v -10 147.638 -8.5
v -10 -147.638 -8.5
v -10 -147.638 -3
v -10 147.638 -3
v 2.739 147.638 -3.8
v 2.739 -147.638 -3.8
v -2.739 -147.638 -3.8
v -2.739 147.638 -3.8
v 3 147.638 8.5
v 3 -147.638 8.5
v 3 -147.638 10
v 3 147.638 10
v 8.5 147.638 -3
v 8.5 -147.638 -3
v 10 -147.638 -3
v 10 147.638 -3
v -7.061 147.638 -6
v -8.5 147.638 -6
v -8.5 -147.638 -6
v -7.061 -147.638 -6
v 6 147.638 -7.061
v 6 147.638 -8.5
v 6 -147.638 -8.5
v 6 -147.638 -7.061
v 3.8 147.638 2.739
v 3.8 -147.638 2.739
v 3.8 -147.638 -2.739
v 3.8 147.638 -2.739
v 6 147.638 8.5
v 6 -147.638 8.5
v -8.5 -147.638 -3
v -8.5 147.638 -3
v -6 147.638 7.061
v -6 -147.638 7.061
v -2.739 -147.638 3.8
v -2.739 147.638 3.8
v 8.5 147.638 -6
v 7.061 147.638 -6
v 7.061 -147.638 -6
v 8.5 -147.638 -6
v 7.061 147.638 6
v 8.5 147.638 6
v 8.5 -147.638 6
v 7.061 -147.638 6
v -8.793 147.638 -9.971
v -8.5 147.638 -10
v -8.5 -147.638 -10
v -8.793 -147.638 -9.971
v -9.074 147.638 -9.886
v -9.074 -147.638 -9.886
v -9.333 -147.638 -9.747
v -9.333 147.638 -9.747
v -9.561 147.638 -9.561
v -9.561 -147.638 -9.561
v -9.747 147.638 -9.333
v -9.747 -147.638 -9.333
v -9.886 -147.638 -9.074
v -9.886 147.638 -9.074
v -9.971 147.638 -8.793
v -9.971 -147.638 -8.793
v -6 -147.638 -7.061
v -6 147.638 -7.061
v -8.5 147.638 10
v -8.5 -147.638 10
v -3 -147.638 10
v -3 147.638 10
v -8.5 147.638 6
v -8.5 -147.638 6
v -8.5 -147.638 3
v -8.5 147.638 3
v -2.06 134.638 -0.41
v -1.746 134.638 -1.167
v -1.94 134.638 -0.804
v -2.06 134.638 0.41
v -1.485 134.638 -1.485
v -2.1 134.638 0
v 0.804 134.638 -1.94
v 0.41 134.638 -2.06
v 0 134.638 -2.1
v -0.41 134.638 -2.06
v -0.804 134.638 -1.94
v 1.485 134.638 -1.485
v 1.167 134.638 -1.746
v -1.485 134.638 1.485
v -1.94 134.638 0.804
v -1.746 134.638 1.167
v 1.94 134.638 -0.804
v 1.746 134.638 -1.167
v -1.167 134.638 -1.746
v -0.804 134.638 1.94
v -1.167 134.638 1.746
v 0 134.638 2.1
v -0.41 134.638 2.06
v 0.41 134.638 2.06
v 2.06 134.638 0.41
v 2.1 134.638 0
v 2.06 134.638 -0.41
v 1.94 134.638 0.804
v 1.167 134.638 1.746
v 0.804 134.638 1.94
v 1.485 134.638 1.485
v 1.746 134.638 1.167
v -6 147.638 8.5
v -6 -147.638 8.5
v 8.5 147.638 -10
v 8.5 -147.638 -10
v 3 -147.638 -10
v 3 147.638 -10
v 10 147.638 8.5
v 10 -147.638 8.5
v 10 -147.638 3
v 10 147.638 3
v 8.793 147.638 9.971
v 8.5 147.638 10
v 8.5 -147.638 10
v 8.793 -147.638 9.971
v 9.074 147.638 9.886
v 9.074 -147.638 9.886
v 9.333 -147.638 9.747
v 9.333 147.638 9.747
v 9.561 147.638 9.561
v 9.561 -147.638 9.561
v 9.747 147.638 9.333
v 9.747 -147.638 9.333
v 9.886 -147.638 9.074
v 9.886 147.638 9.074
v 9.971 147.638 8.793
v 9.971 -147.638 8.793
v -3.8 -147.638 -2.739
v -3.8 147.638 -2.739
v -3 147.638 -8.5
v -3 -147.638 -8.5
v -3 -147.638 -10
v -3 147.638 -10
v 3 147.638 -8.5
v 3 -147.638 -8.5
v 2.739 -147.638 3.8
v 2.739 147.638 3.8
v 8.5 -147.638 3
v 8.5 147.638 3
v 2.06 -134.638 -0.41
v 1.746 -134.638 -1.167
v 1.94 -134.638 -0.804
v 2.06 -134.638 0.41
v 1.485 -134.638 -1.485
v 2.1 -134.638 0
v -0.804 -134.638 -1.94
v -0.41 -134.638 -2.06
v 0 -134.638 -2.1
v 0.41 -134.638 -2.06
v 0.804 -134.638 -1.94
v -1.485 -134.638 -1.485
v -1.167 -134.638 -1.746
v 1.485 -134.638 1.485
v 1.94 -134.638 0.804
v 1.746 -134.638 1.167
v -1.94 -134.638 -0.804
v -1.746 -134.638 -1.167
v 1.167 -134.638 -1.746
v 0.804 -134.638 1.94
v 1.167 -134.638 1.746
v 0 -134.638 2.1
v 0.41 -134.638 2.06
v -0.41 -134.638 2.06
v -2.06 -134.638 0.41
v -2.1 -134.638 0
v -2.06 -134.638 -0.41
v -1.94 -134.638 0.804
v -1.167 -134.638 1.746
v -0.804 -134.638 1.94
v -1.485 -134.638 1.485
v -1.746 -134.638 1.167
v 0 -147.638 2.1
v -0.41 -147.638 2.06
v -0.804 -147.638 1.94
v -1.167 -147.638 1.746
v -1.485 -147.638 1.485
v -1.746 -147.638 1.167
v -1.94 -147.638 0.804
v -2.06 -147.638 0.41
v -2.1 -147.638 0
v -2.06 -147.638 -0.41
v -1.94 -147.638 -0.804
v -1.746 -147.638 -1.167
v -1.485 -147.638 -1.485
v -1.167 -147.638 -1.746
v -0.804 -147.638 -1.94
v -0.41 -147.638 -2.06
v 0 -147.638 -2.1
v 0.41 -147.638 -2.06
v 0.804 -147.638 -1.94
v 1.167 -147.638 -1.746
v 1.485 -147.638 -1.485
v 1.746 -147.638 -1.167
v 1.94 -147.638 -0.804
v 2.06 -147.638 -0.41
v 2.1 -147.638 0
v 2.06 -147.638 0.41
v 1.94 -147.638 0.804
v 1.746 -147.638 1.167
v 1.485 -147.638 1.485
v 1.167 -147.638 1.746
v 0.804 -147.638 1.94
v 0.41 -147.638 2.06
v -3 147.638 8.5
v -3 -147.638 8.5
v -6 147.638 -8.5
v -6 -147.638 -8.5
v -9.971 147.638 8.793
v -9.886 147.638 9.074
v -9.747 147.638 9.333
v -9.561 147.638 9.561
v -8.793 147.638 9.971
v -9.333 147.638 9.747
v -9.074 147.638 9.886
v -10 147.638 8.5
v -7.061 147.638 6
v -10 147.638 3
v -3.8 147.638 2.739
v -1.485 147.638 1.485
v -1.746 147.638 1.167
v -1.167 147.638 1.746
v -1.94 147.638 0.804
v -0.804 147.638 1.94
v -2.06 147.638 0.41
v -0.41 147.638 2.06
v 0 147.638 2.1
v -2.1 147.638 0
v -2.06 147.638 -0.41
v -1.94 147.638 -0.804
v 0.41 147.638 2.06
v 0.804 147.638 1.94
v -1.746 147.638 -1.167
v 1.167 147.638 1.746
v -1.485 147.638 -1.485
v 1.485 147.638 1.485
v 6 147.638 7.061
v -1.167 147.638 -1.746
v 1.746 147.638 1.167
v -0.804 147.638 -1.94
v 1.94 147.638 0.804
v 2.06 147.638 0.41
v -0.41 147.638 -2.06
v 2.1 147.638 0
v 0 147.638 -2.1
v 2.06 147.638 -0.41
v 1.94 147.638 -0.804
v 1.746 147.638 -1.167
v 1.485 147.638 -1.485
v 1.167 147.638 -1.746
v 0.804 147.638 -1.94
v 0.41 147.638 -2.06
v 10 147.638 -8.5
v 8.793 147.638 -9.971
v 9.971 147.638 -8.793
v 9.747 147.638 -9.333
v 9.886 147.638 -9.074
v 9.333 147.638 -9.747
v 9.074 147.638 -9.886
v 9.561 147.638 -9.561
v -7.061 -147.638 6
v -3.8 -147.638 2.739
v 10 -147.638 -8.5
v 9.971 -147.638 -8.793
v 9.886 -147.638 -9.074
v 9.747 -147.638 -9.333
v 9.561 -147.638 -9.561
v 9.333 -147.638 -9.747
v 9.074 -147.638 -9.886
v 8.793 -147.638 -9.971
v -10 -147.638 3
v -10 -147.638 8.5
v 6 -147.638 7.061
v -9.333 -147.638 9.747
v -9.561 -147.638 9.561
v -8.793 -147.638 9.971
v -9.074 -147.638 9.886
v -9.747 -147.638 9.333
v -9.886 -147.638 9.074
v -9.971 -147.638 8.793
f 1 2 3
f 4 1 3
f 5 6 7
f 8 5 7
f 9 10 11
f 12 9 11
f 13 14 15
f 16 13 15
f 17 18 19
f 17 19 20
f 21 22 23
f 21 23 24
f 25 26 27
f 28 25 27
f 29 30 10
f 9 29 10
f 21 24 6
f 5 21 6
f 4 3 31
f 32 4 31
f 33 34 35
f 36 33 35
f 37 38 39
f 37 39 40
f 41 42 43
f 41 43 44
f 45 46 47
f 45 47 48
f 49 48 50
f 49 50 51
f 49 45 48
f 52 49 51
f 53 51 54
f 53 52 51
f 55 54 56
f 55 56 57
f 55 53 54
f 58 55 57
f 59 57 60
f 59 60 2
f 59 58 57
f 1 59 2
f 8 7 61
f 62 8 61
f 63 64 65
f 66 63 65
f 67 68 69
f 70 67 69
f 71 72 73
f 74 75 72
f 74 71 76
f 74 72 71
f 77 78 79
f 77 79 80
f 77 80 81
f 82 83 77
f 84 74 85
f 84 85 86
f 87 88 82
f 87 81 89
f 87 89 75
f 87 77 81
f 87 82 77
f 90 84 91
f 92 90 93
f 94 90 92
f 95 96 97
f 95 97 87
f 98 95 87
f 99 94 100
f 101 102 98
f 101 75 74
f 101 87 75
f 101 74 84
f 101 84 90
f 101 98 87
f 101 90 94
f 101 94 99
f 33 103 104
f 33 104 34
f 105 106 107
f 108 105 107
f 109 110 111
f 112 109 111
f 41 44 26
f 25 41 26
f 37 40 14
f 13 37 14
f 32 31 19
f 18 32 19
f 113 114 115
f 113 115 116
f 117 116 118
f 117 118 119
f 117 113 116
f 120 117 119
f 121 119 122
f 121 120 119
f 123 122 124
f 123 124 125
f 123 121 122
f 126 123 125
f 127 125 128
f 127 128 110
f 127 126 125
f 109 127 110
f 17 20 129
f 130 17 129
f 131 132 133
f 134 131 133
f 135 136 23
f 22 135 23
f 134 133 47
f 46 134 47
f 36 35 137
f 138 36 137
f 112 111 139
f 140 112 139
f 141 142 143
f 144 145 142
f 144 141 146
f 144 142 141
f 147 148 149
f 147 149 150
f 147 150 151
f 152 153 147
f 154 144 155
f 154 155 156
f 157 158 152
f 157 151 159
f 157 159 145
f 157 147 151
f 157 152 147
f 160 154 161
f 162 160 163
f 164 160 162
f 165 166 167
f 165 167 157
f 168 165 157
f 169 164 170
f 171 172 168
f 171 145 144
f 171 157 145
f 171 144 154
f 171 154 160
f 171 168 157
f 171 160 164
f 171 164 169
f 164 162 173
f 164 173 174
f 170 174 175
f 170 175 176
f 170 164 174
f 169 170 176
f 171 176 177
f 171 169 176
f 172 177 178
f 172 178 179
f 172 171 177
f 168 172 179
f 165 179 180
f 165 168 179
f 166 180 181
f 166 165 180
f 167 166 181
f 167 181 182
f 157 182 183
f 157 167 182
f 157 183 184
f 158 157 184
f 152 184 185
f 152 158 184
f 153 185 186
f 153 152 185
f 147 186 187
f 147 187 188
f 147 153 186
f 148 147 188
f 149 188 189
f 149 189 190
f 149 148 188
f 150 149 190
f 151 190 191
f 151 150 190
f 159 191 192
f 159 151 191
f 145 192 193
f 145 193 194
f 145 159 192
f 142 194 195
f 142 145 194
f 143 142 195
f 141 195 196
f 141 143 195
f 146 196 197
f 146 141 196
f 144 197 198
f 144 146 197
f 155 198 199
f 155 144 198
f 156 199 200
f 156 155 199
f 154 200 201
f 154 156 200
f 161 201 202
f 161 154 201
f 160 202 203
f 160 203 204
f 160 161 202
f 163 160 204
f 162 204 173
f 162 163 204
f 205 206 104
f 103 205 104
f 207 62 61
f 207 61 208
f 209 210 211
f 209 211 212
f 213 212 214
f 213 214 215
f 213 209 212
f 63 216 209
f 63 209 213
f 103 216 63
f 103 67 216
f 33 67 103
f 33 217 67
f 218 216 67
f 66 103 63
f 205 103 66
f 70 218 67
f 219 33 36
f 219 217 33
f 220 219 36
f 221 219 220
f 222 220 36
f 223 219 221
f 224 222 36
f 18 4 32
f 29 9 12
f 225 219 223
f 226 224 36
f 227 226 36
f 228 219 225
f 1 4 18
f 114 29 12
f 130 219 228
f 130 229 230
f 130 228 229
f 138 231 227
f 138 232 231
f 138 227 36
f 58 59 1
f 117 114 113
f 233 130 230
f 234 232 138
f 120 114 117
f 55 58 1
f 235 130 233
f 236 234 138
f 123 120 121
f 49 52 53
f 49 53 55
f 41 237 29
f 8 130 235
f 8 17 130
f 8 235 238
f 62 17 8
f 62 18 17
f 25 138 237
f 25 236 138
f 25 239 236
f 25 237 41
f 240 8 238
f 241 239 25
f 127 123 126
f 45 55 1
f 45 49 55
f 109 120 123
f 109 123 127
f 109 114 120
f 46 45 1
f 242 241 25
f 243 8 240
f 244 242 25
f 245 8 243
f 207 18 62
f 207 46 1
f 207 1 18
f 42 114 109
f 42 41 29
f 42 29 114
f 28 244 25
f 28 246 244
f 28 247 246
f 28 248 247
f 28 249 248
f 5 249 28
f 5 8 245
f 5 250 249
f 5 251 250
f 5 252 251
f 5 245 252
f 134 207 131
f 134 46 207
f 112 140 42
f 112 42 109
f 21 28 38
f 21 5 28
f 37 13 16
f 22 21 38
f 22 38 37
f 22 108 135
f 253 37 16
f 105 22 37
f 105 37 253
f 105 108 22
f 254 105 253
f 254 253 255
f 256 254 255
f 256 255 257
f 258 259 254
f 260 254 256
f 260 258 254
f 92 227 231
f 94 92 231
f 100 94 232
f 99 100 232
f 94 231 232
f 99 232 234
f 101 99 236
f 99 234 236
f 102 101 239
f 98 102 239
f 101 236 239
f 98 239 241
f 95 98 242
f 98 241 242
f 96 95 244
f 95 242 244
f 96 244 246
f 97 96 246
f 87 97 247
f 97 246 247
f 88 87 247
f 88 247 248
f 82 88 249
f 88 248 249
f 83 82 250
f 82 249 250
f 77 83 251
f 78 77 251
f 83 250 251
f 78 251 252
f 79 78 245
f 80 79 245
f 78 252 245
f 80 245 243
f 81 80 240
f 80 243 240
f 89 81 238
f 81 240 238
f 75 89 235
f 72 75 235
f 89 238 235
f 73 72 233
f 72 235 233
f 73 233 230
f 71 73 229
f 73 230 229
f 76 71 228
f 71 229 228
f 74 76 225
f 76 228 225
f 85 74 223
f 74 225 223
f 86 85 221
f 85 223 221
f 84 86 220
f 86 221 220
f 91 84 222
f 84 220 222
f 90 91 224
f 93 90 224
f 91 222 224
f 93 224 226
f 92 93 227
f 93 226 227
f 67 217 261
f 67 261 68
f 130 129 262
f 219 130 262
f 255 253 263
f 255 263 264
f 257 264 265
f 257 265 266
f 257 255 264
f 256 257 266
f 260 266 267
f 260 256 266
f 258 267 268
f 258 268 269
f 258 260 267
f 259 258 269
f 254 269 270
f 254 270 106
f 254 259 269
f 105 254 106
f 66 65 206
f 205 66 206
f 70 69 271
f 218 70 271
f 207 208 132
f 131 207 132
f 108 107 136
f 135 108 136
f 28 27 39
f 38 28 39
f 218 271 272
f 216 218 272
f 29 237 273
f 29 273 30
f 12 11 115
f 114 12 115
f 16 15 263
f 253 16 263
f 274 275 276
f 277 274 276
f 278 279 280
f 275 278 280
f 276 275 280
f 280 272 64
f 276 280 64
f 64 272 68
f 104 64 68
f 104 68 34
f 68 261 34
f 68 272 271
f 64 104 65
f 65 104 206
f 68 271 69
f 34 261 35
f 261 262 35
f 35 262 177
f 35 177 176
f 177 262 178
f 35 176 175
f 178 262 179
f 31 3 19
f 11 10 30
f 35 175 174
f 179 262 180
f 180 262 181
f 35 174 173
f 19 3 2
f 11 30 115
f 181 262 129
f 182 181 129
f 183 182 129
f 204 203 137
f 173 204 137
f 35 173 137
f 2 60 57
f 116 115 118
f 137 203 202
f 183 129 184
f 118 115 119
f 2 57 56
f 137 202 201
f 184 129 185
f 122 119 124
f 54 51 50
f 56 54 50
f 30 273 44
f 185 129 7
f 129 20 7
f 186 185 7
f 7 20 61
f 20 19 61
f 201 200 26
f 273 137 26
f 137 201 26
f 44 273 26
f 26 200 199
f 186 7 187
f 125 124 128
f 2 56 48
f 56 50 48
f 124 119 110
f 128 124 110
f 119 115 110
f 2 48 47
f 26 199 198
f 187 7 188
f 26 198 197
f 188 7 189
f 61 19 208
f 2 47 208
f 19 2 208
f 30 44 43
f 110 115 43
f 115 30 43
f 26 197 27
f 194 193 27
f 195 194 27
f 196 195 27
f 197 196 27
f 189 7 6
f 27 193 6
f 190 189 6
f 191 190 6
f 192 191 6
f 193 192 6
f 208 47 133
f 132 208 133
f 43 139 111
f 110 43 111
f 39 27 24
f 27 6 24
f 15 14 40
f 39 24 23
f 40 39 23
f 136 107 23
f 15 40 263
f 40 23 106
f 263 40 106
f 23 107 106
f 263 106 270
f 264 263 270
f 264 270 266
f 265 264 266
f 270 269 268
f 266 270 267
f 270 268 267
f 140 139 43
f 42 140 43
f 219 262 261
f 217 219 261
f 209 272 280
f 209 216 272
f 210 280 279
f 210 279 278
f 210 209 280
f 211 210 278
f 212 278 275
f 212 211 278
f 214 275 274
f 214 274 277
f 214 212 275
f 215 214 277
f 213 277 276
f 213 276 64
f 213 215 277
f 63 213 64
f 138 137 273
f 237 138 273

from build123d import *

# Parameters (mm, degrees)
BOSS_EXTRUDE1_DEPTH     = 147.6375
CUT_EXTRUDE1_DEPTH      = 149.31328803
CUT_EXTRUDE1_DEPTH_BACK = 149.31328803
SKETCH3_R               = 2.1
CUT_EXTRUDE2_DEPTH      = 13
CUT_EXTRUDE3_START      = -13
SKETCH4_R               = 2.1
CUT_EXTRUDE3_DEPTH      = 13


with BuildPart() as part:
    # Sketch1 → Boss-Extrude1 (new, symmetric)
    with BuildSketch(Plane(origin=(0, 0, 0), x_dir=(1, 0, 0), z_dir=(0, 1, 0))):
        with BuildLine():
            Line((-8.5, -10), (8.5, -10))
            ThreePointArc((8.5, -10), (9.560660172, -9.560660172), (10, -8.5))
            Line((10, -8.5), (10, 8.5))
            ThreePointArc((10, 8.5), (9.560660172, 9.560660172), (8.5, 10))
            Line((8.5, 10), (-8.5, 10))
            ThreePointArc((-8.5, 10), (-9.560660172, 9.560660172), (-10, 8.5))
            Line((-10, 8.5), (-10, -8.5))
            ThreePointArc((-10, -8.5), (-9.560660172, -9.560660172), (-8.5, -10))
        make_face()
    extrude(amount=BOSS_EXTRUDE1_DEPTH, both=True)

    # Sketch2 → Cut-Extrude1 (cut, two sides: drawn at the far end of the back side and taken through both)
    with BuildSketch(Plane(origin=(0, 0, 0), x_dir=(1, 0, 0), z_dir=(0, 1, 0)).offset(-CUT_EXTRUDE1_DEPTH_BACK)):
        Polygon((-3, 10), (3, 10), (3, 8.5), (6, 8.5), (6, 7.060660172), (2.739339828, 3.8), (-2.739339828, 3.8), (-6, 7.060660172), (-6, 8.5), (-3, 8.5), align=None)
        Polygon((8.5, -3), (8.5, -6), (7.060660172, -6), (3.8, -2.739339828), (3.8, 2.739339828), (7.060660172, 6), (8.5, 6), (8.5, 3), (10, 3), (10, -3), align=None)
        Polygon((-3, -8.5), (-6, -8.5), (-6, -7.060660172), (-2.739339828, -3.8), (2.739339828, -3.8), (6, -7.060660172), (6, -8.5), (3, -8.5), (3, -10), (-3, -10), align=None)
        Polygon((-8.5, 3), (-8.5, 6), (-7.060660172, 6), (-3.8, 2.739339828), (-3.8, -2.739339828), (-7.060660172, -6), (-8.5, -6), (-8.5, -3), (-10, -3), (-10, 3), align=None)
    extrude(amount=CUT_EXTRUDE1_DEPTH + CUT_EXTRUDE1_DEPTH_BACK, mode=Mode.SUBTRACT)

    # Sketch3 → Cut-Extrude2 (cut)
    with BuildSketch(Plane(origin=(0, 147.6375, 0), x_dir=(1, 0, 0), z_dir=(0, 1, 0))):
        with Locations(Location((0, 0, 0), (0, 0, 270))):
            Circle(SKETCH3_R)
    extrude(amount=-CUT_EXTRUDE2_DEPTH, mode=Mode.SUBTRACT)

    # Sketch4 → Cut-Extrude3 (cut)
    with BuildSketch(Plane.XZ.offset(147.6375).offset(CUT_EXTRUDE3_START)):
        with Locations(Location((0, 0, 0), (0, 0, 90))):
            Circle(SKETCH4_R)
    extrude(amount=CUT_EXTRUDE3_DEPTH, mode=Mode.SUBTRACT)


solid = part.part
